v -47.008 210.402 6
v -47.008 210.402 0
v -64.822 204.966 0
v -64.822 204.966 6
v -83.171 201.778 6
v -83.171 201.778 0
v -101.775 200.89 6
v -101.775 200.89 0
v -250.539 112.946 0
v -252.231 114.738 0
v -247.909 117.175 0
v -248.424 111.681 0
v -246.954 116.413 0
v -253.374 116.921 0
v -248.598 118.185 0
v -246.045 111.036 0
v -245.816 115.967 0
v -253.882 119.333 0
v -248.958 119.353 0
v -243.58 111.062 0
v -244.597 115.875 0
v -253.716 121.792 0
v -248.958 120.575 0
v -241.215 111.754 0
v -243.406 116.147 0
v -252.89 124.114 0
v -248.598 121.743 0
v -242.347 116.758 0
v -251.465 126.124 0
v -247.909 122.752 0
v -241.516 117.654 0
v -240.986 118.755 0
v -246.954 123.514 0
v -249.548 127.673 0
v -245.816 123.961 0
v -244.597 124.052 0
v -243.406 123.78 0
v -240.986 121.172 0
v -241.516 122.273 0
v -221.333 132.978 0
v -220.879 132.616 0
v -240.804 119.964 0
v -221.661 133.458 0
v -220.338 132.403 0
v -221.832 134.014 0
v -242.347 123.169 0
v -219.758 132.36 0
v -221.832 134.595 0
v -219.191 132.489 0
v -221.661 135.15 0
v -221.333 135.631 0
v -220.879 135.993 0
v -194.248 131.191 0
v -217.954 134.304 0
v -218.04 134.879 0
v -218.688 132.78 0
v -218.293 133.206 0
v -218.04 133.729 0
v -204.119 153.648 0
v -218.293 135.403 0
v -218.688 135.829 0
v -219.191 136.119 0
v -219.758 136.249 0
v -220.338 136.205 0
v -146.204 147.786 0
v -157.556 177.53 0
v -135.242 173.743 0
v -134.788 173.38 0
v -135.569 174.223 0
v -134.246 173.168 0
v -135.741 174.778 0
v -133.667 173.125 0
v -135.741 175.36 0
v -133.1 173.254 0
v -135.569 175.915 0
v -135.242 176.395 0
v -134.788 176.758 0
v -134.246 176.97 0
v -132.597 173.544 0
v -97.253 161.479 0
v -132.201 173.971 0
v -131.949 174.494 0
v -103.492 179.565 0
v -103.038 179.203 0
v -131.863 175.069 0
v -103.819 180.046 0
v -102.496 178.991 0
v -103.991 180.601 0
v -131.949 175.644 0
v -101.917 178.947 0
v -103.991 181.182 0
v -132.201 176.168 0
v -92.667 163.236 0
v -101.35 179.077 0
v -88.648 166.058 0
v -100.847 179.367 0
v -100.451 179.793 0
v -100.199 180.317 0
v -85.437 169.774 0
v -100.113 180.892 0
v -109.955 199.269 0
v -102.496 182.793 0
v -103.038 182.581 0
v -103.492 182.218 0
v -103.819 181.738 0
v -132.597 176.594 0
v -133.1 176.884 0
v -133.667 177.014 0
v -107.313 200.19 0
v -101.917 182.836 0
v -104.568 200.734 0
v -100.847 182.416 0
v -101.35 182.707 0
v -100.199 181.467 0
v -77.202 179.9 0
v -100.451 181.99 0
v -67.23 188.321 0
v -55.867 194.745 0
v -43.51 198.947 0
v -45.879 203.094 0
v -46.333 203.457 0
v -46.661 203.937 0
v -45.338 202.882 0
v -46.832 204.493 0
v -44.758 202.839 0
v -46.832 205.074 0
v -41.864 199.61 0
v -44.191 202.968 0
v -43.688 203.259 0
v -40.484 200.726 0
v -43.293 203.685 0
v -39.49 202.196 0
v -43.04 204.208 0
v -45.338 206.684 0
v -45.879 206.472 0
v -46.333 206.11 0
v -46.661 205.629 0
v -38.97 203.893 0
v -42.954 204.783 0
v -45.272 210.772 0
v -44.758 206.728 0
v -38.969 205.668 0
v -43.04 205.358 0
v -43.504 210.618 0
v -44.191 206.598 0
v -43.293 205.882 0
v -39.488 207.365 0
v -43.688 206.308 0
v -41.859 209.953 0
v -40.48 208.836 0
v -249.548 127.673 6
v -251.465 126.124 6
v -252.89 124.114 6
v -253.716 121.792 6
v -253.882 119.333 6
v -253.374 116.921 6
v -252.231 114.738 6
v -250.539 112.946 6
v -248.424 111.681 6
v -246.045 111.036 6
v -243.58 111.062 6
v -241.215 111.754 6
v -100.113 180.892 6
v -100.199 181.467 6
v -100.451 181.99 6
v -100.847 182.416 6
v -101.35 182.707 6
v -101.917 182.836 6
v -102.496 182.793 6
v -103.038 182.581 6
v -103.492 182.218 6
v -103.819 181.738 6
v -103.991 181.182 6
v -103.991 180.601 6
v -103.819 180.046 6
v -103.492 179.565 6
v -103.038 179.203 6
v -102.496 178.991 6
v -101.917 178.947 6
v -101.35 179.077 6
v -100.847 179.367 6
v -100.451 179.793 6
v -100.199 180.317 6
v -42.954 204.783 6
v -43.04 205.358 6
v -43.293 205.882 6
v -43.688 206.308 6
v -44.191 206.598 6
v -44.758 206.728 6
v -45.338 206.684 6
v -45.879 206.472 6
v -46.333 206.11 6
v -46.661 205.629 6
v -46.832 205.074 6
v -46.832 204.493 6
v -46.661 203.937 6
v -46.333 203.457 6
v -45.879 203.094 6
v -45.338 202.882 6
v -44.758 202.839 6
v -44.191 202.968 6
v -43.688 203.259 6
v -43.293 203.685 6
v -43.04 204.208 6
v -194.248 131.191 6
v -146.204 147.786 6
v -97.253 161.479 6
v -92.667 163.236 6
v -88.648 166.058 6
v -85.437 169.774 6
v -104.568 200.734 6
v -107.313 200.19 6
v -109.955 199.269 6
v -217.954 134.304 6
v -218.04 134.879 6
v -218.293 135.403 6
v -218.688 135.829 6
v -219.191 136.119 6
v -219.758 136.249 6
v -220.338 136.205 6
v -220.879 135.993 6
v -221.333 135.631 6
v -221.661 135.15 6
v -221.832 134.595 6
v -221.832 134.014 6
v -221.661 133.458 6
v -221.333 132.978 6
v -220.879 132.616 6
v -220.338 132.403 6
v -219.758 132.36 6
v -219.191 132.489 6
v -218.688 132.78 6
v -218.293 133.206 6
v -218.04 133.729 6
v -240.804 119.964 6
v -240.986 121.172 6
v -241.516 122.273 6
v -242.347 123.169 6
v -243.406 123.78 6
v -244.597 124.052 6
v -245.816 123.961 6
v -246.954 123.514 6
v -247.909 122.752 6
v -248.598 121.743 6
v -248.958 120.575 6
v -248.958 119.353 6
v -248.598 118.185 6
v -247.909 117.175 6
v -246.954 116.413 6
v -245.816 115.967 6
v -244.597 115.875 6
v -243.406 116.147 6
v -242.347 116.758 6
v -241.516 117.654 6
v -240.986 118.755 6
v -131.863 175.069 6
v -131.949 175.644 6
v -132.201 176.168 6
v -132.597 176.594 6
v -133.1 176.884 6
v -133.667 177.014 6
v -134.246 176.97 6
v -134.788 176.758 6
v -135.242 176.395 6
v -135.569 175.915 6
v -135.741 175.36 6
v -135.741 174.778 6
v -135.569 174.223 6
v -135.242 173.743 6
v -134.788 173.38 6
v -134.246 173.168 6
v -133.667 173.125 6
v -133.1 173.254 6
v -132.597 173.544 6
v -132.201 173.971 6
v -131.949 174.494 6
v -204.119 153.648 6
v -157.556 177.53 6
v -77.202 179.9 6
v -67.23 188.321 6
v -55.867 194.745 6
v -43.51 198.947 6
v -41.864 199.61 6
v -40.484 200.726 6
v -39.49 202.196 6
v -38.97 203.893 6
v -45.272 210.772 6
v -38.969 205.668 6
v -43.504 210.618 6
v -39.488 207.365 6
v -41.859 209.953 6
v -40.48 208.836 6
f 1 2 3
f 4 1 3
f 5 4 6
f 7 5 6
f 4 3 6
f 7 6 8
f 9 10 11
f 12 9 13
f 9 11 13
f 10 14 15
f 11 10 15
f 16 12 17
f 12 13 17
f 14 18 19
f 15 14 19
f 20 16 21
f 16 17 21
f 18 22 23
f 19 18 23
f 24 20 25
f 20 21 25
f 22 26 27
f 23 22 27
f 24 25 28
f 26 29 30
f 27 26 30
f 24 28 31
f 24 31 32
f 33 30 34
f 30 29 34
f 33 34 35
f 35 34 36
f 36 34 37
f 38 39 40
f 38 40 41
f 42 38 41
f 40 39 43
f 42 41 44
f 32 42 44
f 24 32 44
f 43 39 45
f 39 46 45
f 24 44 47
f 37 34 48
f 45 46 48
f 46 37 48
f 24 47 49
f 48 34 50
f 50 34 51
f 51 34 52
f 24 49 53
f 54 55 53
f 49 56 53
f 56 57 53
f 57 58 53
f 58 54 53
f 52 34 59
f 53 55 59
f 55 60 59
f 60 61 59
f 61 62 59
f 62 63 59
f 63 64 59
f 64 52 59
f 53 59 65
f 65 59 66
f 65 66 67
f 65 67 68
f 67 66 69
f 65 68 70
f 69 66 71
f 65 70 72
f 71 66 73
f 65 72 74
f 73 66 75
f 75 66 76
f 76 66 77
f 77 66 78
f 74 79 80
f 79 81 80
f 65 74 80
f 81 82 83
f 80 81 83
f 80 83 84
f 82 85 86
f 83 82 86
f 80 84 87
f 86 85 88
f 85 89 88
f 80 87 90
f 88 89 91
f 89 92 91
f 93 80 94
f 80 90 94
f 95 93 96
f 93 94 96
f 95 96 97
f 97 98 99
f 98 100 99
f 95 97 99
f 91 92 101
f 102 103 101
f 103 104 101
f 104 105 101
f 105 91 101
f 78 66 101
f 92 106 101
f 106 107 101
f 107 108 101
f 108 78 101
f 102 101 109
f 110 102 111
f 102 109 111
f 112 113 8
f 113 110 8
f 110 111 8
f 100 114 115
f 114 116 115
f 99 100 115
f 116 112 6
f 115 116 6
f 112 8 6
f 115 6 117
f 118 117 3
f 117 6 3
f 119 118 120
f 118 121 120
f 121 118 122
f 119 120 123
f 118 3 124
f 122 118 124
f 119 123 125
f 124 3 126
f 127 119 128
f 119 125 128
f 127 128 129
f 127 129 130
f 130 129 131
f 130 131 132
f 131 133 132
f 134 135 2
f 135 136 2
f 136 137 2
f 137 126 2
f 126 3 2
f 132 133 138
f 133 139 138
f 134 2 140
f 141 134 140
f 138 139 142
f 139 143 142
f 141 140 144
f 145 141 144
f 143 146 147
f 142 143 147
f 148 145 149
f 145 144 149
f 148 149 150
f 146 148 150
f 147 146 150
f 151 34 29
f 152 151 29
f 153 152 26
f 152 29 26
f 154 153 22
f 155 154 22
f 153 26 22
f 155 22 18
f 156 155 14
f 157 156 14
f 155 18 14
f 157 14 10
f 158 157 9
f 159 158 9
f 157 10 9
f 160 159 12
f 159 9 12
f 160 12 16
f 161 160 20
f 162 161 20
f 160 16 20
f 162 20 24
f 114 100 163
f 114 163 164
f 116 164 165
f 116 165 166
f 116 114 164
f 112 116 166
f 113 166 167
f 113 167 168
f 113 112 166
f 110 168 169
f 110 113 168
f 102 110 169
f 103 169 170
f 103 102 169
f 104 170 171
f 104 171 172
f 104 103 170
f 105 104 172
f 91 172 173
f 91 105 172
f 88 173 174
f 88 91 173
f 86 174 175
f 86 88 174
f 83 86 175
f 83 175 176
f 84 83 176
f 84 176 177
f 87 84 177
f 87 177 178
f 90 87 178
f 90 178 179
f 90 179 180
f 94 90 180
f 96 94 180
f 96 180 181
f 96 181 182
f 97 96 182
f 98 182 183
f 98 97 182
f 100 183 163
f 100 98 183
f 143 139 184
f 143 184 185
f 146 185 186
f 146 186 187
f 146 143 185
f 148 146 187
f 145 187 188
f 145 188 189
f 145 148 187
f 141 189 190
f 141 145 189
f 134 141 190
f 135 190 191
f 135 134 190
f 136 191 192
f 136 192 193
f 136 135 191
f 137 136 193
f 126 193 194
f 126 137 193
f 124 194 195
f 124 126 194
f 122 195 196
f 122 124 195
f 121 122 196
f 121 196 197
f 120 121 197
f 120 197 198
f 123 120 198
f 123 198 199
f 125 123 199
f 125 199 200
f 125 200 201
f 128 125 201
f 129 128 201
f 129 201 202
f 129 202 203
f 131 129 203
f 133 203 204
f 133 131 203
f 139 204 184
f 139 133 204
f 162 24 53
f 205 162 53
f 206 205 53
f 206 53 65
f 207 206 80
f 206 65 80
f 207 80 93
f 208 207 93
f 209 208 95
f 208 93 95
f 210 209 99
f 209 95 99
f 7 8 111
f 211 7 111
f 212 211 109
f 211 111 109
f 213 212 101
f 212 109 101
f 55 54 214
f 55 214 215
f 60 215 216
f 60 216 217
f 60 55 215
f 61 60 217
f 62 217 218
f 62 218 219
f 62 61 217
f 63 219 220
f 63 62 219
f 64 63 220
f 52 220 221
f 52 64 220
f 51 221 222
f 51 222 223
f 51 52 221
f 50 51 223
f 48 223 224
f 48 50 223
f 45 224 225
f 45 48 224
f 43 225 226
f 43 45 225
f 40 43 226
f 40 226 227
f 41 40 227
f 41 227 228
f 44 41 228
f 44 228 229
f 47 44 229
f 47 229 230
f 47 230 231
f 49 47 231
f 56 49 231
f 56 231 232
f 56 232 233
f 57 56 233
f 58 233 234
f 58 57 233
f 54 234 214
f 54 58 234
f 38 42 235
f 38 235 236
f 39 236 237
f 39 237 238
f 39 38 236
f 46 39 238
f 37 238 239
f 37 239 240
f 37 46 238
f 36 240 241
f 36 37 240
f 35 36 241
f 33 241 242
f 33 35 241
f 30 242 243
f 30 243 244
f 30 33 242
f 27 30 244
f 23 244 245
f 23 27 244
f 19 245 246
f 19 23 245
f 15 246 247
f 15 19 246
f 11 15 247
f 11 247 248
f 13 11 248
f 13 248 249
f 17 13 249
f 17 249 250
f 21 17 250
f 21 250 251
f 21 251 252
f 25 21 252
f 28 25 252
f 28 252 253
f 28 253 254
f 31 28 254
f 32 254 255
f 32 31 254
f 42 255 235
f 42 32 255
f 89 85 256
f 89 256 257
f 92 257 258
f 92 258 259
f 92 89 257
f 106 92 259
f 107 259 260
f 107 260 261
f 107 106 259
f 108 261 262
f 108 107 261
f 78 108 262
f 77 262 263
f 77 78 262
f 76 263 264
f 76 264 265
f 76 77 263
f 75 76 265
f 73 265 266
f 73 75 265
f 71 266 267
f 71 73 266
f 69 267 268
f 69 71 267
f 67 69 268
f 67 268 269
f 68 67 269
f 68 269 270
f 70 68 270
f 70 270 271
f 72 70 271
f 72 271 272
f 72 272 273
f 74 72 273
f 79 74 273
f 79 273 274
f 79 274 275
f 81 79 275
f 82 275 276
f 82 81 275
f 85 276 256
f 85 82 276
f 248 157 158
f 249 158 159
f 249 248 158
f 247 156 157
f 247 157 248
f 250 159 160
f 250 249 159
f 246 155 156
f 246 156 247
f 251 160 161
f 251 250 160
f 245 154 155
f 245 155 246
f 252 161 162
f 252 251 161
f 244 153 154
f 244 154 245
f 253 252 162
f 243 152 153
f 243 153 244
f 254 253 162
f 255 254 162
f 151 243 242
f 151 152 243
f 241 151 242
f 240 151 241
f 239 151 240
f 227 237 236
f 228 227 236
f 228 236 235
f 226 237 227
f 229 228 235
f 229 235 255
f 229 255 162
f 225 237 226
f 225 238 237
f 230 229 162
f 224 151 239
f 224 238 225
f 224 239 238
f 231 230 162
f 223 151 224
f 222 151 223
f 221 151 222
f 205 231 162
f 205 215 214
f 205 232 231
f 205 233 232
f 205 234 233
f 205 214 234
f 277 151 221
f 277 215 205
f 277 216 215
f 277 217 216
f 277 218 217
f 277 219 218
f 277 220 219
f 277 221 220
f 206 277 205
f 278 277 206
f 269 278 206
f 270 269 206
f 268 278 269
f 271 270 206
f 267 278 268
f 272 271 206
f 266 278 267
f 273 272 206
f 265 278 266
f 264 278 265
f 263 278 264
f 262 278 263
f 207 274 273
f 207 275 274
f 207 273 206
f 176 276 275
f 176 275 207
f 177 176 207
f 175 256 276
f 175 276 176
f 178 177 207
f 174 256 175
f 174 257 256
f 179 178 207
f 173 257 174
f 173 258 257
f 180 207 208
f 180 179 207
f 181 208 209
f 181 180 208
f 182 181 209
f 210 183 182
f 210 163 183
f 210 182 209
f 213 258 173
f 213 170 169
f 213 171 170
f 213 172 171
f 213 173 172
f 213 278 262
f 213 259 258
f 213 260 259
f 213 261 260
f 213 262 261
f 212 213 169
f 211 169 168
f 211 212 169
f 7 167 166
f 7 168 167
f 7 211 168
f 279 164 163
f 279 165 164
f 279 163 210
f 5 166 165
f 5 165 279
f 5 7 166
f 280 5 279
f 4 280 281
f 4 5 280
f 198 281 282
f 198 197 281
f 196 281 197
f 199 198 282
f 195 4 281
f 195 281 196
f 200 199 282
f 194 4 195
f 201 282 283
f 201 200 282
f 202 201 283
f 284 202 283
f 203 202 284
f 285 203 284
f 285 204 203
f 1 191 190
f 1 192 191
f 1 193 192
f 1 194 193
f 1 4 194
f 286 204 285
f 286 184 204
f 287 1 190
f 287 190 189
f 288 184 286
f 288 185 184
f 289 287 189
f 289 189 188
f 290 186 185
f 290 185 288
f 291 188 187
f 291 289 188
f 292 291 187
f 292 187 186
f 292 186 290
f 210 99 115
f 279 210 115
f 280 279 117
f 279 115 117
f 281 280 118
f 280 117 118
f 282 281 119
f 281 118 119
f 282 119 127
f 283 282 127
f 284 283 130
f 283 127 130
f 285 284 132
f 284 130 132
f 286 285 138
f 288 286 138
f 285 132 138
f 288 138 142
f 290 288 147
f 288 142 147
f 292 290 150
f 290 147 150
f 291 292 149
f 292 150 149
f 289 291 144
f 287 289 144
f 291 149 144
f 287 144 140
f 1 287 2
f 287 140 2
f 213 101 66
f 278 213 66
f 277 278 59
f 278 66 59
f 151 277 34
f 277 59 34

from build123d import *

# Parameters (mm, degrees)
SKETCH1_R           = 1.95
SKETCH1_R_2         = 4.1
BOSS_EXTRUDE1_DEPTH = 6


with BuildPart() as part:
    # Sketch1 → Boss-Extrude1 (new body)
    with BuildSketch(Plane.XY):
        with BuildLine():
            ThreePointArc((-249.547735749, 127.673100022), (-252.877471407, 115.79000474), (-241.215192405, 111.754370772))
            ThreePointArc((-241.215192405, 111.754370772), (-170.350070338, 139.847528819), (-97.252990361, 161.478708942))
            ThreePointArc((-97.252990361, 161.478708942), (-90.570551573, 164.523097822), (-85.437324527, 169.774123618))
            ThreePointArc((-85.437324527, 169.774123618), (-67.229564843, 188.321481613), (-43.509998386, 198.94735421))
            ThreePointArc((-43.509998386, 198.94735421), (-39.165402052, 206.535635416), (-47.008101374, 210.402106199))
            ThreePointArc((-47.008101374, 210.402106199), (-73.946915163, 203.086860773), (-101.774691803, 200.889737355))
            ThreePointArc((-101.774691803, 200.889737355), (-105.950118059, 200.510334794), (-109.954702491, 199.268789688))
            ThreePointArc((-109.954702491, 199.268789688), (-180.973525069, 165.854124566), (-249.547735749, 127.673100022))
        make_face()
        with Locations((-102.0625187, 180.89180857)):
            Circle(SKETCH1_R, mode=Mode.SUBTRACT)
        with Locations((-44.903785826, 204.783222318)):
            Circle(SKETCH1_R, mode=Mode.SUBTRACT)
        with Locations((-244.903785826, 119.963772612)):
            Circle(SKETCH1_R_2, mode=Mode.SUBTRACT)
        with Locations((-219.903785826, 134.304249979)):
            Circle(SKETCH1_R, mode=Mode.SUBTRACT)
        with Locations((-133.8125187, 175.069049716)):
            Circle(SKETCH1_R, mode=Mode.SUBTRACT)
    extrude(amount=BOSS_EXTRUDE1_DEPTH)


solid = part.part
